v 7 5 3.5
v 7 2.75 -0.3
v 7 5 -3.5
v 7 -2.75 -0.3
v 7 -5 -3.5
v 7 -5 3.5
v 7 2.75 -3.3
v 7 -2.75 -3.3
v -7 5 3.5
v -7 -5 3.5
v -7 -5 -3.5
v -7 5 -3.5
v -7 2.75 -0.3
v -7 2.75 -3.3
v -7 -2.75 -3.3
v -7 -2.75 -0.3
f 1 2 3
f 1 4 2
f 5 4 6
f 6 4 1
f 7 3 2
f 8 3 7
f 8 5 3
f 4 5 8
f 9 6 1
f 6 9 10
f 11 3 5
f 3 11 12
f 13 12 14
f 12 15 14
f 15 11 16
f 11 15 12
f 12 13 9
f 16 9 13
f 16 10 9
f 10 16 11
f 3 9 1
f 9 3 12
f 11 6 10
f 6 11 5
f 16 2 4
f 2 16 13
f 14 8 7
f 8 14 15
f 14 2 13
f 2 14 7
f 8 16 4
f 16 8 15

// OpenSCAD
// Real zip-tie tunnel pattern.
// Demonstrates a bridge body, an actual tunnel cut, and a preview tie path.

$fn = 32;

bridge_length = 14;
bridge_width = 10;
bridge_height = 7;
tunnel_width = 5.5;
tunnel_height = 3.0;
tie_preview_thickness = 1.4;
show_tie_preview = true;

module bridge_body() {
    cube([bridge_length, bridge_width, bridge_height], center = true);
}

module tunnel_cut() {
    // Overlap beyond the body so the tunnel is a true pass-through.
    translate([0, 0, -bridge_height / 2 + tunnel_height / 2 + 0.2])
        cube([bridge_length + 1.0, tunnel_width, tunnel_height], center = true);
}

module zip_tie_path_preview() {
    if (show_tie_preview)
        %color([0.0, 0.8, 1.0, 0.35])
            translate([0, 0, -bridge_height / 2 + tunnel_height / 2 + 0.2])
                cube([bridge_length + 2.0, 4.0, tie_preview_thickness], center = true);
}

module real_zip_tie_tunnel() {
    difference() {
        bridge_body();
        tunnel_cut();
    }
    zip_tie_path_preview();
}

real_zip_tie_tunnel();
